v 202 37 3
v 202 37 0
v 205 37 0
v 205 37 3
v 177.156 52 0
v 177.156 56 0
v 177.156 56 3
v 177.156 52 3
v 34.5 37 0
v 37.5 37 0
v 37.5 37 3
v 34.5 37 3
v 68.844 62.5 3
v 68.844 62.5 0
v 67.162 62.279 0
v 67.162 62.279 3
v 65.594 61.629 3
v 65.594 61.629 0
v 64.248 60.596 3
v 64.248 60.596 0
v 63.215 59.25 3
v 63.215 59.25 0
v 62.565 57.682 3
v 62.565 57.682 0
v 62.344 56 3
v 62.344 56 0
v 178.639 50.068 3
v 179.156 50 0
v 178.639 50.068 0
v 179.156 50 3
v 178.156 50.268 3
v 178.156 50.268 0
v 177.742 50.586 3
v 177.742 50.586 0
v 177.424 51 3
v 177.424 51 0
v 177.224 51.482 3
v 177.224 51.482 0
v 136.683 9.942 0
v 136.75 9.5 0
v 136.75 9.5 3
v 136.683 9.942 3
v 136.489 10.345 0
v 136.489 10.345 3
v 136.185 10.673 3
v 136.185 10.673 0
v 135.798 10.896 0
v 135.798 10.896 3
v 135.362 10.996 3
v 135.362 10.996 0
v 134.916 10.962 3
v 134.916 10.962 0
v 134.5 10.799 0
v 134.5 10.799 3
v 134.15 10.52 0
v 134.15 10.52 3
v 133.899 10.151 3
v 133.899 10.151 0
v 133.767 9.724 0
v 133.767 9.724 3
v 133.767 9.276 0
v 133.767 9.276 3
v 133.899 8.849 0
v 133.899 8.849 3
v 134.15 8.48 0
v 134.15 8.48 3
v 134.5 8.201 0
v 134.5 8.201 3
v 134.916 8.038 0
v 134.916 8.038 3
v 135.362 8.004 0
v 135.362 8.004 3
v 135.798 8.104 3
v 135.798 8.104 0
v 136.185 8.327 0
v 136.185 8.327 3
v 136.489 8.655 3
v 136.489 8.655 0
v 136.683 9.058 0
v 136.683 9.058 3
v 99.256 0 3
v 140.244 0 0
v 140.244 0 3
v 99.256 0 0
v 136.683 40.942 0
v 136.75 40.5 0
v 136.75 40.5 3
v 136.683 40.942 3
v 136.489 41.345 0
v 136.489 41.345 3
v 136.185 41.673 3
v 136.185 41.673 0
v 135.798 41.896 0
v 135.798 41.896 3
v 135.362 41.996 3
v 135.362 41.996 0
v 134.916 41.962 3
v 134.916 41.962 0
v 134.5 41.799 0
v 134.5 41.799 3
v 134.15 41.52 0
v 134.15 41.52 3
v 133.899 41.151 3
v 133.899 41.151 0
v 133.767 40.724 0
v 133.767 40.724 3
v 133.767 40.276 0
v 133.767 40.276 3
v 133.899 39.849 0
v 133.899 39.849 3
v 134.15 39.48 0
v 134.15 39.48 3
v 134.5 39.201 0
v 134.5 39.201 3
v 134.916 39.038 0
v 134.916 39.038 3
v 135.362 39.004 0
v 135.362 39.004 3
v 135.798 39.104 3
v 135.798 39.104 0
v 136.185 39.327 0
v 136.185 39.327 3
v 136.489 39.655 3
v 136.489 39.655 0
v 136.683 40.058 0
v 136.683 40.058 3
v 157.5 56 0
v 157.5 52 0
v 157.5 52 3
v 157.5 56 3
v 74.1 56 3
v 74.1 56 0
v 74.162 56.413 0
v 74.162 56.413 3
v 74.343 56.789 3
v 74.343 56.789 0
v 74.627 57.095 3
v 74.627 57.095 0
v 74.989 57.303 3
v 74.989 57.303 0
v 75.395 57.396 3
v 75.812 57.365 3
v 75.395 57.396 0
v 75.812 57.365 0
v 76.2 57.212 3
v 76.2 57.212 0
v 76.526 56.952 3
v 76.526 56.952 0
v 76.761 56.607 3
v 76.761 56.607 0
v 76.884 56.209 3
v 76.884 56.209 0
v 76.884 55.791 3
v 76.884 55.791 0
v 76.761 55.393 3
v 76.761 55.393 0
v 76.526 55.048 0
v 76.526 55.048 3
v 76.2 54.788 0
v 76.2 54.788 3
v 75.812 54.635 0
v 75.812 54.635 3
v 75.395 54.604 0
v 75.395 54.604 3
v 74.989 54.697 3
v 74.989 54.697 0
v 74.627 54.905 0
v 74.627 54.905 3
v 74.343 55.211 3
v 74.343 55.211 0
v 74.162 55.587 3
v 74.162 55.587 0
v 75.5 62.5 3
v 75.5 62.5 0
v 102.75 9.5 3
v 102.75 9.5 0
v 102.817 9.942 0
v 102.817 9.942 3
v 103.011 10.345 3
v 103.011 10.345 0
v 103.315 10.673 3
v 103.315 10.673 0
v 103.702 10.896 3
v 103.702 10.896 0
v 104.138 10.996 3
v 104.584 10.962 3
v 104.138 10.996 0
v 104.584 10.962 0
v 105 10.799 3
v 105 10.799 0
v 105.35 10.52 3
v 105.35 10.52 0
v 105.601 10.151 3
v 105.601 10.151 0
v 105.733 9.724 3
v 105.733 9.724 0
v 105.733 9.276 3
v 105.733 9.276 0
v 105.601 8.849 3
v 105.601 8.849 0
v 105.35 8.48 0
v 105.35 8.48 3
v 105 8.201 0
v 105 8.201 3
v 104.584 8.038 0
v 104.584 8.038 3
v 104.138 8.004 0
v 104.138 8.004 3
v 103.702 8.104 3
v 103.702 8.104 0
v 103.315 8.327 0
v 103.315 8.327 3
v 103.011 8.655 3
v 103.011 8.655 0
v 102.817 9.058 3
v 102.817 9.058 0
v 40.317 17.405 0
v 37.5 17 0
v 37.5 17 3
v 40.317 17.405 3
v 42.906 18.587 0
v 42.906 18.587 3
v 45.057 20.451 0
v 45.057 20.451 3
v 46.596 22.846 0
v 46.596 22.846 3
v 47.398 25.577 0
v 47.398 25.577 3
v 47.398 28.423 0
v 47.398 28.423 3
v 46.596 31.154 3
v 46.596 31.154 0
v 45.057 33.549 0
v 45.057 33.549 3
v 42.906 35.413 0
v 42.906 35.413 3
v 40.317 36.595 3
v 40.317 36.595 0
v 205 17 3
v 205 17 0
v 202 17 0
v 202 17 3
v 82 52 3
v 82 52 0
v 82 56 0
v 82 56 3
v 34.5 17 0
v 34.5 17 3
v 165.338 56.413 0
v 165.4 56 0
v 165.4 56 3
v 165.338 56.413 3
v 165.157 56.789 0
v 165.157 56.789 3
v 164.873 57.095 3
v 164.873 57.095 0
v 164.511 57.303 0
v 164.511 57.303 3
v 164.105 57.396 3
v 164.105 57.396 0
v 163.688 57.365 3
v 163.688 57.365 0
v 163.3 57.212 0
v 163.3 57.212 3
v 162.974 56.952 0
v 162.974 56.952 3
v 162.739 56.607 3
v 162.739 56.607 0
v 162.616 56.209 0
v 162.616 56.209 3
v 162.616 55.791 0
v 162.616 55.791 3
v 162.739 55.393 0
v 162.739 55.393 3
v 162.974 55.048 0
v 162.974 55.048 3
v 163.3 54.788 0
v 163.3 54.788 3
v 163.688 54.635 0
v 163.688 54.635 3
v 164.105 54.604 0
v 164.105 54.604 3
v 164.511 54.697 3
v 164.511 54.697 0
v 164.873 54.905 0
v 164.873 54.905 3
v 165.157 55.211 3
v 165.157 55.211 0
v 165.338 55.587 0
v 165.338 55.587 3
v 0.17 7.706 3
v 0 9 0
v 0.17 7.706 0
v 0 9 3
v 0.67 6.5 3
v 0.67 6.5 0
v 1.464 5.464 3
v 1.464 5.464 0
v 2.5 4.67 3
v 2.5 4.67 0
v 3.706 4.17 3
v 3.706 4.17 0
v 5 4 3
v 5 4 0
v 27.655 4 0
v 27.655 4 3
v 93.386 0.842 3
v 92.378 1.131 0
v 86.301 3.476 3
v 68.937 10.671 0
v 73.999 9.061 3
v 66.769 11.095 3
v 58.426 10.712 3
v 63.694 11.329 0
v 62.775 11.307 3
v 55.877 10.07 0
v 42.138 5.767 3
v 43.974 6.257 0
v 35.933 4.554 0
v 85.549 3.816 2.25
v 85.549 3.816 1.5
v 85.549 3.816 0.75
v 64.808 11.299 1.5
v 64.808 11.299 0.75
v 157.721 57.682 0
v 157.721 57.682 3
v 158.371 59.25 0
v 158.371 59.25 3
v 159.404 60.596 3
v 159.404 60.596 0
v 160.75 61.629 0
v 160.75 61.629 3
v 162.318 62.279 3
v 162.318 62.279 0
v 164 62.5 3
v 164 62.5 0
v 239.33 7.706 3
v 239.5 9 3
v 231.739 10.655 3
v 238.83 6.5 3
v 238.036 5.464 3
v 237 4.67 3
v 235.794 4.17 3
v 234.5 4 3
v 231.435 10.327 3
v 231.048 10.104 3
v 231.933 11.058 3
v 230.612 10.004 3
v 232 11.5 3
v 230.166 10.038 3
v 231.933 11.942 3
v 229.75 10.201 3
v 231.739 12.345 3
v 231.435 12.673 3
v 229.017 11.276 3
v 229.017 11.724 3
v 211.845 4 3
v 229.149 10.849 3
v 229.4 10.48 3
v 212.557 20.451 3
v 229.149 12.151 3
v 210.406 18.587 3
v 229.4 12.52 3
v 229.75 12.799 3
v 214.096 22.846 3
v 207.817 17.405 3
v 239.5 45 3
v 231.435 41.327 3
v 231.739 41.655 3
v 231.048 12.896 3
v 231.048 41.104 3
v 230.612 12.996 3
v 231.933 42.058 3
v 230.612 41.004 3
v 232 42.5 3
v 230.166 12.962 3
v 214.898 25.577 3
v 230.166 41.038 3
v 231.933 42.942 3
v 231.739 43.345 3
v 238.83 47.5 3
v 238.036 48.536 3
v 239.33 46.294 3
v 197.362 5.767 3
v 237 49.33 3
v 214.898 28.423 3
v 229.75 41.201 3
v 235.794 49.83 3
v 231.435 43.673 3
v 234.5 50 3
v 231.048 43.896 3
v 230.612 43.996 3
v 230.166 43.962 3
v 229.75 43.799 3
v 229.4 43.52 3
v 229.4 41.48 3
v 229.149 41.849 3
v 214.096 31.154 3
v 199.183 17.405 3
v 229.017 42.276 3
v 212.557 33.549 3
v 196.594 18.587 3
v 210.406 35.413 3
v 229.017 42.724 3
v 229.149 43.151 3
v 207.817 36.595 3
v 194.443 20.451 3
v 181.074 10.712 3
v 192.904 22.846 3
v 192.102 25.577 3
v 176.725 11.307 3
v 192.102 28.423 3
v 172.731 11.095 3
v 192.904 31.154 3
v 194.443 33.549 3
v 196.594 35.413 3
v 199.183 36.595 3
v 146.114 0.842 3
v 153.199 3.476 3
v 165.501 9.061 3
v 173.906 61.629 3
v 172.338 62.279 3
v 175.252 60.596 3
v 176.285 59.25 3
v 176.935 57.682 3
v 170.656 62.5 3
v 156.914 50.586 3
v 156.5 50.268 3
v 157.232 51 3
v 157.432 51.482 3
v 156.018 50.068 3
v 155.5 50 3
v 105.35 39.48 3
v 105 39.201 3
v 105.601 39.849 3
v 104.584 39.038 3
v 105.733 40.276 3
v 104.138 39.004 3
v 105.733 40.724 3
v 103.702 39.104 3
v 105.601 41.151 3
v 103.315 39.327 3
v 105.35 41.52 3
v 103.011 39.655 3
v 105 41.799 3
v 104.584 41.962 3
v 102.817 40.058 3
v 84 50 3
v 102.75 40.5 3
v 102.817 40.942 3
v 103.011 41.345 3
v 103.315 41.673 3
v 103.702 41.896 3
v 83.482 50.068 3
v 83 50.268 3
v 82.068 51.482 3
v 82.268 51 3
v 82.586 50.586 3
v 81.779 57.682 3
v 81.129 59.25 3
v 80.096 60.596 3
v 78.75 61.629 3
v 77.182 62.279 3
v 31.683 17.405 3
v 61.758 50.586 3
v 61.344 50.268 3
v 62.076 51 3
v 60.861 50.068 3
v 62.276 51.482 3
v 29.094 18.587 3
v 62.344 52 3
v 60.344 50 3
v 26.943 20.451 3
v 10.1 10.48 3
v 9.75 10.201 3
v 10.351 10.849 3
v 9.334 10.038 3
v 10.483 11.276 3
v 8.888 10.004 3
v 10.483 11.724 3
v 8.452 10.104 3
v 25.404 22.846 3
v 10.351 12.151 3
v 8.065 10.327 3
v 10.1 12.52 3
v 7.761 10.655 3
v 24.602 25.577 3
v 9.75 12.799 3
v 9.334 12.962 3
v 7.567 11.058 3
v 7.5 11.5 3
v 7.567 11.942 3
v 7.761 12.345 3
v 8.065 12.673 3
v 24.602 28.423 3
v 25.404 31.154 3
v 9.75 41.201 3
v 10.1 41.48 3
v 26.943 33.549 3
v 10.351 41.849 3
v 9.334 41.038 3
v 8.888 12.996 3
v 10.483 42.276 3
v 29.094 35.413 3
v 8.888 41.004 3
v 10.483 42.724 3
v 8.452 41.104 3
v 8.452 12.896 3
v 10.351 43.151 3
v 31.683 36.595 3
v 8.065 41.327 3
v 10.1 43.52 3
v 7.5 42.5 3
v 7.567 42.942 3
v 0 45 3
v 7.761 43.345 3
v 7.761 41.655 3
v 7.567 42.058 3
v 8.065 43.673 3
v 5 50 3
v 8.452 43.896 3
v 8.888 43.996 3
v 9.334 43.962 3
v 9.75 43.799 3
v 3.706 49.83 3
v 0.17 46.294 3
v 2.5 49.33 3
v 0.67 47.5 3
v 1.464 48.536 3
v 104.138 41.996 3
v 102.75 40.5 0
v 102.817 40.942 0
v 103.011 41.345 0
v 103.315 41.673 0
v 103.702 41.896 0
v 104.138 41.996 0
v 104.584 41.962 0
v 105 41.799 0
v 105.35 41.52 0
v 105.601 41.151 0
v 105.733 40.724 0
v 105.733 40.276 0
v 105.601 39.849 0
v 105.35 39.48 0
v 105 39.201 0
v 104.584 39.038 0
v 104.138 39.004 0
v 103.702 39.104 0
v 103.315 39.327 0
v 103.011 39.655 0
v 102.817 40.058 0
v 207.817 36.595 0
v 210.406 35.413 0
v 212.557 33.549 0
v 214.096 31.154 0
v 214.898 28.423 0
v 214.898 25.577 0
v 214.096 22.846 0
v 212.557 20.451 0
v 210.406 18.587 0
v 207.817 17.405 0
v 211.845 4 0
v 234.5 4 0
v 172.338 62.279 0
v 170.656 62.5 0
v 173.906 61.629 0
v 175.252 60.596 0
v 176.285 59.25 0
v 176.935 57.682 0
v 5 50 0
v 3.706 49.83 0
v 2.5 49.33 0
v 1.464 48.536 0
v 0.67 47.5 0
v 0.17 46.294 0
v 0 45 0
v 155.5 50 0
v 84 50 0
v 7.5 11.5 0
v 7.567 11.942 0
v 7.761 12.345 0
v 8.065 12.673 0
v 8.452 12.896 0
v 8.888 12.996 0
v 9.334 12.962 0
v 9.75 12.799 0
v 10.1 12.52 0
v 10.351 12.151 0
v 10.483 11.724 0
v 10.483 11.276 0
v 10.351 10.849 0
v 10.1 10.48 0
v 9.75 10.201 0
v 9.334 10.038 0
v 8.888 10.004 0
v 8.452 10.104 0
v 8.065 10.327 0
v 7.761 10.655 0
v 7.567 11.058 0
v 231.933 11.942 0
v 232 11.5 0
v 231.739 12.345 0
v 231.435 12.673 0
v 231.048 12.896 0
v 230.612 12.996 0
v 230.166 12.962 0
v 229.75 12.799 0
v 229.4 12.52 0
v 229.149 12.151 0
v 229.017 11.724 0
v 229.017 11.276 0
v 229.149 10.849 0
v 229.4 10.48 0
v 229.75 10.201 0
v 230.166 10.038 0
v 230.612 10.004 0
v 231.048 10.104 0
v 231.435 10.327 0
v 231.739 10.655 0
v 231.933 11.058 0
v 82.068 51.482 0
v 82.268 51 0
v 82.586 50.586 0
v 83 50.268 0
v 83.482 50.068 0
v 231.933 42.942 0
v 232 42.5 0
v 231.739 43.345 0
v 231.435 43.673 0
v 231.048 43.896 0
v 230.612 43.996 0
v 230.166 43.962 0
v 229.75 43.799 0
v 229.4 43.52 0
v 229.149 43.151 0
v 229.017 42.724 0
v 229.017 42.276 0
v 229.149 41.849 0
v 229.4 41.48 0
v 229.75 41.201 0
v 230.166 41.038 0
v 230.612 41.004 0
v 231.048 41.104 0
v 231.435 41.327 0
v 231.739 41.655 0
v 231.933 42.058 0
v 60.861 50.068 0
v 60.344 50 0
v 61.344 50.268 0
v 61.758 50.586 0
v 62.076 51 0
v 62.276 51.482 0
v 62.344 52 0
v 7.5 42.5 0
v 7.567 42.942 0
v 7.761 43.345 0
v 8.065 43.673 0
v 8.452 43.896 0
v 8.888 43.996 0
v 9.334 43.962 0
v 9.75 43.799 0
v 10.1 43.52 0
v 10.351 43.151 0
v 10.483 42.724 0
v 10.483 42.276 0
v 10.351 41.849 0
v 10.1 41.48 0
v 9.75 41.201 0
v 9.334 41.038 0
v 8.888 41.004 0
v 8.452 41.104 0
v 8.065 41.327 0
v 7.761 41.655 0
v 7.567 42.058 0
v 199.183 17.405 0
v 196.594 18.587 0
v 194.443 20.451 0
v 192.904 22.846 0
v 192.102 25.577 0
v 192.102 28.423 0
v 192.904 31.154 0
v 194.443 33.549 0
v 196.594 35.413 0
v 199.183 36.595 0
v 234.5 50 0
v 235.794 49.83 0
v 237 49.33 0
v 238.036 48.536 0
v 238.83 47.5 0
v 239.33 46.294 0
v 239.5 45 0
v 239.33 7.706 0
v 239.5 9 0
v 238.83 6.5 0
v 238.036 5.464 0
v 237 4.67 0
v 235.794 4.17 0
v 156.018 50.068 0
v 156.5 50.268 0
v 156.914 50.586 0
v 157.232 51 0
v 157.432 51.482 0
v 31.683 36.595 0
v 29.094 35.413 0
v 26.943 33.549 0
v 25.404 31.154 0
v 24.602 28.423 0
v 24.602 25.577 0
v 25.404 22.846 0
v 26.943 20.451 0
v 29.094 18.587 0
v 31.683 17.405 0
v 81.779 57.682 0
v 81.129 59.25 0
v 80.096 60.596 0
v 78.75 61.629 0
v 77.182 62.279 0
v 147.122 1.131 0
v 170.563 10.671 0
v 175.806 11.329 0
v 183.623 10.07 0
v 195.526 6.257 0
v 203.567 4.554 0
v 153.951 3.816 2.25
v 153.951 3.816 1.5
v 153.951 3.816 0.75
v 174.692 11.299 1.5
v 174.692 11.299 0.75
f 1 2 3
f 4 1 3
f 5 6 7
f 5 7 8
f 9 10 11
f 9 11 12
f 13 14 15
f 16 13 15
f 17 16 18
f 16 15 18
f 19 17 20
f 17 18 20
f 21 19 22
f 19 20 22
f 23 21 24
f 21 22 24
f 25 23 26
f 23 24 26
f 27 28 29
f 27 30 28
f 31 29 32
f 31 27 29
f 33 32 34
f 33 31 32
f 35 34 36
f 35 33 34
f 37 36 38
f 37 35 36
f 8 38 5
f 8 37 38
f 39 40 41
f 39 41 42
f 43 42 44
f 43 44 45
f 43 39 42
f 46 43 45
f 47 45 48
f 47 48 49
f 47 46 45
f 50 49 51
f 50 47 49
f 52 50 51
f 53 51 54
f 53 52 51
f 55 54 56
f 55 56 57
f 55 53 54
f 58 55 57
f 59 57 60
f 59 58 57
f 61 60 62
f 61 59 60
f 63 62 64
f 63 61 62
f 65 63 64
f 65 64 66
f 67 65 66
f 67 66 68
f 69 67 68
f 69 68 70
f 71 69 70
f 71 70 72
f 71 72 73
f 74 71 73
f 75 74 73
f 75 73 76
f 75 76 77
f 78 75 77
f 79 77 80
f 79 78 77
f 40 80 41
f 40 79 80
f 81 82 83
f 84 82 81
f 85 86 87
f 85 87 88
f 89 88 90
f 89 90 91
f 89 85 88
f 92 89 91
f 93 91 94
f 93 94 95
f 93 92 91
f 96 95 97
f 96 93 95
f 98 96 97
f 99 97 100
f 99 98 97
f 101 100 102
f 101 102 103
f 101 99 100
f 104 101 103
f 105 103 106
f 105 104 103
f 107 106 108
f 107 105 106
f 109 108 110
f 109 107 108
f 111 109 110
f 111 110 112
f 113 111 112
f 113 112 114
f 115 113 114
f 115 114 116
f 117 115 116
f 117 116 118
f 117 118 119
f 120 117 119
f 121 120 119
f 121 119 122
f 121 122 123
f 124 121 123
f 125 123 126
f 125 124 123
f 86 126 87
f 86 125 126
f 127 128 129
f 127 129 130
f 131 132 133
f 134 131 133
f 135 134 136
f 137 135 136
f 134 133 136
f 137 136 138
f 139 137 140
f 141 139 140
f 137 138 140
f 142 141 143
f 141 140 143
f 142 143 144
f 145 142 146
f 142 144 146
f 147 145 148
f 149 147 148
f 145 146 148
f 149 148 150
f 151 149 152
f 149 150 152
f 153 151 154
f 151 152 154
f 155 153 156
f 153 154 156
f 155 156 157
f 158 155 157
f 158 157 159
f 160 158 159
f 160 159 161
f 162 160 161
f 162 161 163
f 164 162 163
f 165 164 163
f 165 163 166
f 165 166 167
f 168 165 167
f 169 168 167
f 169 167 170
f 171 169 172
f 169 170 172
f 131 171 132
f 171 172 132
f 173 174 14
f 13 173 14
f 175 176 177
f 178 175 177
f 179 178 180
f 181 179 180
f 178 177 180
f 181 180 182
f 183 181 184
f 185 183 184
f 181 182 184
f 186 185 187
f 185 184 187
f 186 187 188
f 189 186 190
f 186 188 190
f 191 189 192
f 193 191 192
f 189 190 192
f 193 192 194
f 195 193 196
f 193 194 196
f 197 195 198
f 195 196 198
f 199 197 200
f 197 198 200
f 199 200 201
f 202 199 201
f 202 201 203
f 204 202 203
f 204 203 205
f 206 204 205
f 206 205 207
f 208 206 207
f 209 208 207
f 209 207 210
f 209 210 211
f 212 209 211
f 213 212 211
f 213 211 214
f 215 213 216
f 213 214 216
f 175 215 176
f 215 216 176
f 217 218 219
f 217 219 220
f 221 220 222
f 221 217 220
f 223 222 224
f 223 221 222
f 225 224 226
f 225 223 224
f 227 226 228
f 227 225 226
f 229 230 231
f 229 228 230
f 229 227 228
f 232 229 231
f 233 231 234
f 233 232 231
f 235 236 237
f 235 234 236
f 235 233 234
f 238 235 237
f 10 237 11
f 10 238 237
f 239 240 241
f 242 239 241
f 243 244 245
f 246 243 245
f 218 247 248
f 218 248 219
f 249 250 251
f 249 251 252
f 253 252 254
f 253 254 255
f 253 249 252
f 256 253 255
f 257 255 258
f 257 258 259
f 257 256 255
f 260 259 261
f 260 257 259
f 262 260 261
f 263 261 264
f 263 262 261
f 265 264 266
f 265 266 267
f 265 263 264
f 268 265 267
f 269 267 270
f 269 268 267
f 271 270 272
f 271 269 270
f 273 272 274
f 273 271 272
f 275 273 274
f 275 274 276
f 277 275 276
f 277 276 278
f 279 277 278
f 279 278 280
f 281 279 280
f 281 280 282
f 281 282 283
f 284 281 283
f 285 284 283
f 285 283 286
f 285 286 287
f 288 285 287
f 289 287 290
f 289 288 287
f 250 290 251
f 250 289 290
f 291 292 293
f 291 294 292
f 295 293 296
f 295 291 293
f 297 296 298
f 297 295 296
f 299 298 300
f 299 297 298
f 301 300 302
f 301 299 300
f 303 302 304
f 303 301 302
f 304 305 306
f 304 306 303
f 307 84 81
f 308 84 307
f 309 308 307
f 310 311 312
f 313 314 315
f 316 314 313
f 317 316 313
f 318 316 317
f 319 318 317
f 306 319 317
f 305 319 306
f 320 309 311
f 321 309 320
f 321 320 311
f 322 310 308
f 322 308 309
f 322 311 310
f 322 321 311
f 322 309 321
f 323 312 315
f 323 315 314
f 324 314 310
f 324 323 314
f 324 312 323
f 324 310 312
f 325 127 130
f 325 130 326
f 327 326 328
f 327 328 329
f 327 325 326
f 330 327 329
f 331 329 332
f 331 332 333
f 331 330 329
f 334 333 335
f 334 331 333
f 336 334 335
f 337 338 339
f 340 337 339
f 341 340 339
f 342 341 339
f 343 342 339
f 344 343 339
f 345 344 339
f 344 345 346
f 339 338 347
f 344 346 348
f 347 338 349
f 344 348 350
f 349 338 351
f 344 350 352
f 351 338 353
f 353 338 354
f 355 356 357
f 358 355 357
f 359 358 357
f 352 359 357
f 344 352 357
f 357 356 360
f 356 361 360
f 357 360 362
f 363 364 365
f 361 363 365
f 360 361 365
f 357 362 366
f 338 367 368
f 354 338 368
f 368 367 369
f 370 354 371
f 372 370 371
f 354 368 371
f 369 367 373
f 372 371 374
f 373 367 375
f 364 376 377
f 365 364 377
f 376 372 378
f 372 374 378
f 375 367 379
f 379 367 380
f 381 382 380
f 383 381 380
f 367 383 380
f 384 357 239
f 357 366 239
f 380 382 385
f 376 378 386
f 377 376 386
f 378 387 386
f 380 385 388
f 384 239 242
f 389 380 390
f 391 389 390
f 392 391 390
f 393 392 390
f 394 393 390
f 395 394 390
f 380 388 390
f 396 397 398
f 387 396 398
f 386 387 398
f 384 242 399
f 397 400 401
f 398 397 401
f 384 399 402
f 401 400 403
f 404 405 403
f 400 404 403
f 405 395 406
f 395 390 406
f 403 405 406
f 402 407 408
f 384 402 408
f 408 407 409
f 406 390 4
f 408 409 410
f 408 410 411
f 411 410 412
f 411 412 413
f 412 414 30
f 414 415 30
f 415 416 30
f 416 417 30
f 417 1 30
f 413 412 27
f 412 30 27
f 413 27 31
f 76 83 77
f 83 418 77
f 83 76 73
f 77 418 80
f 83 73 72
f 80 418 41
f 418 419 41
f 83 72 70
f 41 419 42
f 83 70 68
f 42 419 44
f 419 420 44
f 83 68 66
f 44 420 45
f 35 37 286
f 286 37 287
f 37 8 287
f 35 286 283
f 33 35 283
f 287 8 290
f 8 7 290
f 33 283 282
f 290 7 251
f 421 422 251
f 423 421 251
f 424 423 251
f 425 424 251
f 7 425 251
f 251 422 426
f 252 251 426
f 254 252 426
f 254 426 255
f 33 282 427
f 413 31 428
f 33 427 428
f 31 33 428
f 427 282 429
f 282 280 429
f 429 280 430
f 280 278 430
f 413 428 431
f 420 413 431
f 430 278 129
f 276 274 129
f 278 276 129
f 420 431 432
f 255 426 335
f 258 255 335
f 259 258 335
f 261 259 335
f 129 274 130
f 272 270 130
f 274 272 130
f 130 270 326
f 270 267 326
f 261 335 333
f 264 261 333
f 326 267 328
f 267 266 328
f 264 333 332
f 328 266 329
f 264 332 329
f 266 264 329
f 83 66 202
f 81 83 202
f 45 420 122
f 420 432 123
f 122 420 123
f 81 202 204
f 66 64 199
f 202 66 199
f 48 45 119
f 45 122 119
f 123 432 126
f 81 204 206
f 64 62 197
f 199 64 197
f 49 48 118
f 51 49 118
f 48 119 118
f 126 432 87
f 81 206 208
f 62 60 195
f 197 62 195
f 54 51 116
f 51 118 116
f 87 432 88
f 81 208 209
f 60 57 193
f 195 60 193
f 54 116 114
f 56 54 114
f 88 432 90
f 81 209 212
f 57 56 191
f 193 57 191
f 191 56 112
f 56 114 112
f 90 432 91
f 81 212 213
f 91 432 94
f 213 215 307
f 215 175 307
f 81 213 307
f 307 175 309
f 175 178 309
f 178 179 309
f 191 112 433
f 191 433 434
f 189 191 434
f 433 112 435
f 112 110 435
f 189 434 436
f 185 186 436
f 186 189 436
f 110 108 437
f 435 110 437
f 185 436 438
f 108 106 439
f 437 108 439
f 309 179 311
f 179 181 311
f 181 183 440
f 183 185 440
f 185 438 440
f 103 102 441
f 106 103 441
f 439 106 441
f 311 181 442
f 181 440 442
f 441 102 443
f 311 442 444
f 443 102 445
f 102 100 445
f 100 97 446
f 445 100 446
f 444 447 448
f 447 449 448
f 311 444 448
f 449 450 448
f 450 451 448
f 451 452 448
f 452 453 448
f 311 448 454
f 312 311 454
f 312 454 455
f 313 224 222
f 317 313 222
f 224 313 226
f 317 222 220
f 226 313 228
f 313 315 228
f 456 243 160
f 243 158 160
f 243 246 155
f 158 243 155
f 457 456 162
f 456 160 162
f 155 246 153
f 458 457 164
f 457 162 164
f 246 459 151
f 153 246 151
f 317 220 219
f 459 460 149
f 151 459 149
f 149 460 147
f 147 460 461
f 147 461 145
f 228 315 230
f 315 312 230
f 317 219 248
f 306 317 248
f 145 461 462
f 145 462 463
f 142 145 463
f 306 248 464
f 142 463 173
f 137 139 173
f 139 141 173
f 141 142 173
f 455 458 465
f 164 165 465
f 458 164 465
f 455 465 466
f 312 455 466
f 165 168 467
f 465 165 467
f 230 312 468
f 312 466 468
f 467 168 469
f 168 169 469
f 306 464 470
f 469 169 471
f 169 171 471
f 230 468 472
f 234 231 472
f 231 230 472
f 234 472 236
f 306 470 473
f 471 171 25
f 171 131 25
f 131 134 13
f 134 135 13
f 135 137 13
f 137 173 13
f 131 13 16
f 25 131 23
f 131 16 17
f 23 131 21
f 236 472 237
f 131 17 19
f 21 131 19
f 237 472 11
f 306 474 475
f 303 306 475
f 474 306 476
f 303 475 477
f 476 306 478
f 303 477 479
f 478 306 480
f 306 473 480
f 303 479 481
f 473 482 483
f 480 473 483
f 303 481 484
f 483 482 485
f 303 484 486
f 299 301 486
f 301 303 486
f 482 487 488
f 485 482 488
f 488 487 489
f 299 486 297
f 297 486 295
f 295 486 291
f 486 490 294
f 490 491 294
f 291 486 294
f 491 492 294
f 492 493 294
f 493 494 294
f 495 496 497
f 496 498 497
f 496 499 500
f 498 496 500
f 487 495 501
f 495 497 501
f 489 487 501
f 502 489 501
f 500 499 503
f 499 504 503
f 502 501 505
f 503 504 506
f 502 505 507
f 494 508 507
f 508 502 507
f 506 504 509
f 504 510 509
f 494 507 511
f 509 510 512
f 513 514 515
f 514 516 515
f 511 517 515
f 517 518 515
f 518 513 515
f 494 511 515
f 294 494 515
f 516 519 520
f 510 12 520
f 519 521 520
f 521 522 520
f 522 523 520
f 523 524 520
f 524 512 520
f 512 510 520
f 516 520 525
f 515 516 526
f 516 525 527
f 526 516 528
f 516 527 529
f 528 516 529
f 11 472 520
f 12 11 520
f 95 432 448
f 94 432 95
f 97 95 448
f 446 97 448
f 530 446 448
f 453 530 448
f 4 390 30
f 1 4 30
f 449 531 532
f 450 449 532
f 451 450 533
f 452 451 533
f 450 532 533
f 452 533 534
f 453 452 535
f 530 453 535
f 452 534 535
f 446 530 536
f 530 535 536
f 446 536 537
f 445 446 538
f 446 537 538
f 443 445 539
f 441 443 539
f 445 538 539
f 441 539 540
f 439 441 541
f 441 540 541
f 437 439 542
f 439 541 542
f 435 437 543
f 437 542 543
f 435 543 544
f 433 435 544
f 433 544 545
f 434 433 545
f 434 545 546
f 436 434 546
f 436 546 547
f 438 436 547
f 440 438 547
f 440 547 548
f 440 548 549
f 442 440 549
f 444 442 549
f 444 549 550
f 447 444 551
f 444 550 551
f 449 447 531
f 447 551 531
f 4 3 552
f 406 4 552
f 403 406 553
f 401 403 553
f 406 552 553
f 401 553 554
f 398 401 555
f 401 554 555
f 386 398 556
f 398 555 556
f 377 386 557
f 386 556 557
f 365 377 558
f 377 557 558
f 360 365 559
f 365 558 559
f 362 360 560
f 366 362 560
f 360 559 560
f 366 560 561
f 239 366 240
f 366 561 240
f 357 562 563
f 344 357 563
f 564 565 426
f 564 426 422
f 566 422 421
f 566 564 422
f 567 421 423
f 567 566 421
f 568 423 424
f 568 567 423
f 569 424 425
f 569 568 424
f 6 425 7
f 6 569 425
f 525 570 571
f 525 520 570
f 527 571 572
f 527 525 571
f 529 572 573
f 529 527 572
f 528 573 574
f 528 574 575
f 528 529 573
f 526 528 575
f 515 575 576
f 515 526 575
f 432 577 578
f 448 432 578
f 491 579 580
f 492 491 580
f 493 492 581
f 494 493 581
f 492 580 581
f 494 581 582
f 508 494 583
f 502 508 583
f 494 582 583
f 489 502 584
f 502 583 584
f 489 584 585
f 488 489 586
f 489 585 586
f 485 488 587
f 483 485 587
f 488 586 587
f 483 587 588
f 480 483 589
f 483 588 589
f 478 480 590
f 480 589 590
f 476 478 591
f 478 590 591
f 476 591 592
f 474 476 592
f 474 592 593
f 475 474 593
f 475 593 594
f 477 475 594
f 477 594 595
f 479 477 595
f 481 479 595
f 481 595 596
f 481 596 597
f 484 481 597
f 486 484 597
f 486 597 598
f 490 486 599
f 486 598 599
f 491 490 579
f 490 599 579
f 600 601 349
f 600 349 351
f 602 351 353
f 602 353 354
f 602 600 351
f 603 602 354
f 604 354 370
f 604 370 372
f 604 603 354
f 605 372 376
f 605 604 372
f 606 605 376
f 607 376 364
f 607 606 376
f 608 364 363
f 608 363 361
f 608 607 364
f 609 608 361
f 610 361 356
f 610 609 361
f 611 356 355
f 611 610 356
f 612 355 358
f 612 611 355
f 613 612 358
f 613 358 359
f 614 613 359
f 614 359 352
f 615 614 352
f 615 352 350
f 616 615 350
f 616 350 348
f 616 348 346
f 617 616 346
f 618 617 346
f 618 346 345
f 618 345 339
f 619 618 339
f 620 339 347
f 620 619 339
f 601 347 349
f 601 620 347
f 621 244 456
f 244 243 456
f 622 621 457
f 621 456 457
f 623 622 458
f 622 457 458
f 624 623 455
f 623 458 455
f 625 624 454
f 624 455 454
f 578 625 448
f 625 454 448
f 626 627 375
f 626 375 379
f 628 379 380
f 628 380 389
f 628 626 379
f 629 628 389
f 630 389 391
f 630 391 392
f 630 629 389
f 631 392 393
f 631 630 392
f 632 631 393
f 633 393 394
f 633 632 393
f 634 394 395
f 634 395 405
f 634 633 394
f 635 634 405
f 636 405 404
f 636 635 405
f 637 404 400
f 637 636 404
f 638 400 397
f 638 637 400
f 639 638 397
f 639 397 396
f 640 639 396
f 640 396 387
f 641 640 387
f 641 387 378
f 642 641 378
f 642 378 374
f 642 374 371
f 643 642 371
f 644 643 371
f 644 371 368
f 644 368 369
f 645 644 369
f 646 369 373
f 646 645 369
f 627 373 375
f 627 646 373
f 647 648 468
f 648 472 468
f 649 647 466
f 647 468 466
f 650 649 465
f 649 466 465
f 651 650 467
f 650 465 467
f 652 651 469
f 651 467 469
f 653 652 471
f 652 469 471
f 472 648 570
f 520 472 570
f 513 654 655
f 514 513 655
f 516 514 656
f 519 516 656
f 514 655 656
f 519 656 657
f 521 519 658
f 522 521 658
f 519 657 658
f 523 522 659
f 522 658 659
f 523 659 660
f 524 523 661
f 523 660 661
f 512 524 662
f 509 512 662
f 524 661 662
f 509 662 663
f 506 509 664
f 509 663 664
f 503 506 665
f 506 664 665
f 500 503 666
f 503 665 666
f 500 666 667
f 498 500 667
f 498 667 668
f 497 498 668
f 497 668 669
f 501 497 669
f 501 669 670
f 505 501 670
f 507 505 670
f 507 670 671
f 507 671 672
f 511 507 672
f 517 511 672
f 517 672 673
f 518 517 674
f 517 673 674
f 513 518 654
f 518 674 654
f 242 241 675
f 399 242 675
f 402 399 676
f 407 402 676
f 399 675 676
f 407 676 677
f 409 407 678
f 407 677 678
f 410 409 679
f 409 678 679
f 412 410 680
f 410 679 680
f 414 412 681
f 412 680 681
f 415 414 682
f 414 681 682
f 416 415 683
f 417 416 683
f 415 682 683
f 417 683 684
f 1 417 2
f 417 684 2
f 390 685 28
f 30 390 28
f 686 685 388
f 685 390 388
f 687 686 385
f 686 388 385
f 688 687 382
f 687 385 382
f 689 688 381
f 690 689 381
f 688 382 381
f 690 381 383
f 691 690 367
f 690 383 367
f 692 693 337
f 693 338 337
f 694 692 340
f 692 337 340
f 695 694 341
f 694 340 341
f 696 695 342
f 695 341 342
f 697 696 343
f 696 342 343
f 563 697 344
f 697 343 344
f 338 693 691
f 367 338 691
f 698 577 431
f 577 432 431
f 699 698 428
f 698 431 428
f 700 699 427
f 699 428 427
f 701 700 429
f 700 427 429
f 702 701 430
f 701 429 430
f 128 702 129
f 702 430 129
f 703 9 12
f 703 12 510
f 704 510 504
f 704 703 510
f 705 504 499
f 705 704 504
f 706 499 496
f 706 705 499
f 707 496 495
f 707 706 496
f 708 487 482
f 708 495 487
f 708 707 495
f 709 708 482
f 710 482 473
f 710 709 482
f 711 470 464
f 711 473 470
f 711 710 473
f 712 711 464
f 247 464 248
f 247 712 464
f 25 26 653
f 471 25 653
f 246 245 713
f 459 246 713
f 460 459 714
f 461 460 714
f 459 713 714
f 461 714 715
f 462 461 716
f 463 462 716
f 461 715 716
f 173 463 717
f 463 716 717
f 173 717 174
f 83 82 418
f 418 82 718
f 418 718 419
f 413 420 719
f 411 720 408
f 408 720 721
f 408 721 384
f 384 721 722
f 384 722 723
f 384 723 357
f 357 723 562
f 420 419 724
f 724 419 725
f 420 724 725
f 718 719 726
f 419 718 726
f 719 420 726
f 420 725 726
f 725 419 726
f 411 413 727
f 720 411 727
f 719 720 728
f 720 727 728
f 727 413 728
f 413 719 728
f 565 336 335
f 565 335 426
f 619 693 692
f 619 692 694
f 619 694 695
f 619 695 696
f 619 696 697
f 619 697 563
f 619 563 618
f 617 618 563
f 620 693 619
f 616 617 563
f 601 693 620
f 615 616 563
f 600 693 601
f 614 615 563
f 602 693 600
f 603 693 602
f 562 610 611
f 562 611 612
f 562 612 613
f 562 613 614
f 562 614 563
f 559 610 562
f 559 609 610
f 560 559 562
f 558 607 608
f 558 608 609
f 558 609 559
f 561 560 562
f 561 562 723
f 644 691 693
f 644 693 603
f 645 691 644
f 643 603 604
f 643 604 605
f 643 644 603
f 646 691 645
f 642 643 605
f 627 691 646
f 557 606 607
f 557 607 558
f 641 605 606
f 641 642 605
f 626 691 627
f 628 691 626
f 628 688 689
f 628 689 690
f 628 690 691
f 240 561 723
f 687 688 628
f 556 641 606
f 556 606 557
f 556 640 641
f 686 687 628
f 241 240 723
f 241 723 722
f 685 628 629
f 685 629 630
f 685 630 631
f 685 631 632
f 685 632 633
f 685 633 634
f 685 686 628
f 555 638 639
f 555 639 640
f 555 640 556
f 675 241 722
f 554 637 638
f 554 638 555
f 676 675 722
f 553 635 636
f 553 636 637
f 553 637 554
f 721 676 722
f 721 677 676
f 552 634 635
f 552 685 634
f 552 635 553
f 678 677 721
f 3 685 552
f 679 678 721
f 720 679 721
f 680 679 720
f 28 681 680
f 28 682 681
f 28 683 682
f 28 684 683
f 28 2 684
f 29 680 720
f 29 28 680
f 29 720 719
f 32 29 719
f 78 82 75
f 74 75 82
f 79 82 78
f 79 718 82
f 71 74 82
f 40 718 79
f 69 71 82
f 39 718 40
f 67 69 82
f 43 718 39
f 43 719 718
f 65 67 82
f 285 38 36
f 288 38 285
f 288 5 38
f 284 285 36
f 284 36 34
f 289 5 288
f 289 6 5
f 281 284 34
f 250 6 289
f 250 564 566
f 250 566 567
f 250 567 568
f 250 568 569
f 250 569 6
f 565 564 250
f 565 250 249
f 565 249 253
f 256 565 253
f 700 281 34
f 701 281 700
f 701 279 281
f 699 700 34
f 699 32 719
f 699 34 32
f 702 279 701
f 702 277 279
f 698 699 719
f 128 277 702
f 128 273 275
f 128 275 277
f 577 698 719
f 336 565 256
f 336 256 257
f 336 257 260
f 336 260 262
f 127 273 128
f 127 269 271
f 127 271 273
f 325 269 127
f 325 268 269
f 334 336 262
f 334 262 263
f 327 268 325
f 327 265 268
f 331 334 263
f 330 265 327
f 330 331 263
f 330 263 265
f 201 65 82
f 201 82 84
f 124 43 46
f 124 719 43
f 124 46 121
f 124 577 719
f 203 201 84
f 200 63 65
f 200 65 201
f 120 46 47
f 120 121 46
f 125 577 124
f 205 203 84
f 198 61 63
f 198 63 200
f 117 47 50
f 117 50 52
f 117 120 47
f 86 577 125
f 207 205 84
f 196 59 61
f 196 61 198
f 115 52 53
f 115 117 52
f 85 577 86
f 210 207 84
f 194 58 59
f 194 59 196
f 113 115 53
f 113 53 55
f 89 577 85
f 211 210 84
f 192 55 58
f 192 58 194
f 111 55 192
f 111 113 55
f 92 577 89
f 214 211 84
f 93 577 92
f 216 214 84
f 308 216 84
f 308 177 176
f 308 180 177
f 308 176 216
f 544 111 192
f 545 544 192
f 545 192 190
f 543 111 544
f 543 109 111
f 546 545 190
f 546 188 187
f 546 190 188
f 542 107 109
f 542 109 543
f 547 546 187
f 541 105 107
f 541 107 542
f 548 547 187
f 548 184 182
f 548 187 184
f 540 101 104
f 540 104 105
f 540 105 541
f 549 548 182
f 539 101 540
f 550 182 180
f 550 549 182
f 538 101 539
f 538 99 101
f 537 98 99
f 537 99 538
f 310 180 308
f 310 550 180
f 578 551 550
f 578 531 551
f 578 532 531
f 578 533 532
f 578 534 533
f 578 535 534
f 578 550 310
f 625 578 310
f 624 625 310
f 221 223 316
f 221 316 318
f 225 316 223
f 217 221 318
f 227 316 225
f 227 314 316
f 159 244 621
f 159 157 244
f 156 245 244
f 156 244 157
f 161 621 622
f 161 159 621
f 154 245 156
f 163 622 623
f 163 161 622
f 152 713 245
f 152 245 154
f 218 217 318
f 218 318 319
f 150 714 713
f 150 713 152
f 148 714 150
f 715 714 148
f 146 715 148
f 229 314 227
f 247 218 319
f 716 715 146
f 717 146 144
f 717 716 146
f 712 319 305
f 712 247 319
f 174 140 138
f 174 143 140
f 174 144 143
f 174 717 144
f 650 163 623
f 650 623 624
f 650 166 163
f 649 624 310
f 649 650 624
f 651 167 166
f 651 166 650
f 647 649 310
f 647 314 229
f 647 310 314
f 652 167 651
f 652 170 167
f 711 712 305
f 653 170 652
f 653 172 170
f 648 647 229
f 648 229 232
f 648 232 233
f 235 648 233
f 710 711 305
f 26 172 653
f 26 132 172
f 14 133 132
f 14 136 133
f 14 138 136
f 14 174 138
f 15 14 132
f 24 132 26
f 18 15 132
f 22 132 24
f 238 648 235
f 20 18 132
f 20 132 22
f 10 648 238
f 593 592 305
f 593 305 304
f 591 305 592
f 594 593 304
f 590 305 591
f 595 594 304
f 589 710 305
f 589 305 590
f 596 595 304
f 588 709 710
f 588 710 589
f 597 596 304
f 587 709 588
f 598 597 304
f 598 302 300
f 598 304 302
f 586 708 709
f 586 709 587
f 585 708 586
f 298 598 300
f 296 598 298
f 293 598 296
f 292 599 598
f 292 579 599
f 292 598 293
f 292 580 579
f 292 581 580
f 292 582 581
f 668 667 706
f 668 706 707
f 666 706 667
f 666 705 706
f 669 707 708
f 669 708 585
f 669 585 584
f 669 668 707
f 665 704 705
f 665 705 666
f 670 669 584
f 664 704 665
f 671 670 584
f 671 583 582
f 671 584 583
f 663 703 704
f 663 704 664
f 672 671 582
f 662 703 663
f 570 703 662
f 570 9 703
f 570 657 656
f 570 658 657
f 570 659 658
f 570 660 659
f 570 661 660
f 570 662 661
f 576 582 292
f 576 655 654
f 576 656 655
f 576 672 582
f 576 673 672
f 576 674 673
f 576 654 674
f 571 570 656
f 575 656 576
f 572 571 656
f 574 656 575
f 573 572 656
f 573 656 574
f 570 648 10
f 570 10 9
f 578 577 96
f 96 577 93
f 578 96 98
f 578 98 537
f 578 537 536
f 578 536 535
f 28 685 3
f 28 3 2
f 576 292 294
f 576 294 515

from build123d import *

# Parameters (mm, degrees)
SKETCH1_W           = 119.75
SKETCH1_H           = 50
BOSS_EXTRUDE1_DEPTH = 3
SKETCH2_R           = 1.5
CUT_EXTRUDE1_DEPTH  = 3
SKETCH3_R           = 1.4
BOSS_EXTRUDE2_DEPTH = 3
FILLET1_R           = 2
CUT_EXTRUDE2_DEPTH  = 10
FILLET2_R           = 5
CUT_EXTRUDE3_DEPTH  = 10


with BuildPart() as part:
    # Sketch1 → Boss-Extrude1 (new body)
    with BuildSketch(Plane.XY):
        with Locations((59.875, 25)):
            Rectangle(SKETCH1_W, SKETCH1_H)
    extrude(amount=BOSS_EXTRUDE1_DEPTH)

    # Sketch2 → Cut-Extrude1 (cut)
    with BuildSketch(Plane(origin=(0, 0, 0), x_dir=(-1, 0, 0), z_dir=(0, 0, -1))):
        with Locations((-104.25, 40.5)):
            Circle(SKETCH2_R)
        with Locations((-104.25, 9.5)):
            Circle(SKETCH2_R)
        with Locations((-9, 42.5)):
            Circle(SKETCH2_R)
        with Locations((-9, 11.5)):
            Circle(SKETCH2_R)
    extrude(amount=-CUT_EXTRUDE1_DEPTH, mode=Mode.SUBTRACT)

    # Mirror1: part across plane


with BuildPart() as part_1:
    add(part.part)
    add(part.part.mirror(Plane(origin=(119.75, 0, 3), x_dir=(0, 0, 1), z_dir=(-1, 0, 0))))

    # Sketch3 → Boss-Extrude2 (add)
    with BuildSketch(Plane(origin=(0, 0, 0), x_dir=(-1, 0, 0), z_dir=(0, 0, -1))):
        with BuildLine():
            Line((-82, 50), (-82, 56))
            ThreePointArc((-82, 56), (-80.096194078, 60.596194078), (-75.5, 62.5))
            Line((-75.5, 62.5), (-68.843823796, 62.5))
            ThreePointArc((-68.843823796, 62.5), (-64.247629718, 60.596194078), (-62.343823796, 56))
            Line((-62.343823796, 56), (-62.343823796, 50))
            Line((-62.343823796, 50), (-82, 50))
        make_face()
        with Locations((-75.5, 56)):
            Circle(SKETCH3_R, mode=Mode.SUBTRACT)
    boss_extrude2 = extrude(amount=-BOSS_EXTRUDE2_DEPTH)

    # Mirror2: Boss-Extrude2 across plane
    add(boss_extrude2.mirror(Plane(origin=(119.75, 0, 0), x_dir=(0, 0, 1), z_dir=(1, 0, 0))))

    # Fillet1
    fillet1_edges = [part_1.edges().sort_by_distance(p)[0] for p in [
        (177.156176204, 50, 1.5),
        (157.5, 50, 1.5),
        (62.343823796, 50, 1.5),
        (82, 50, 1.5),
    ]]
    fillet(fillet1_edges, radius=FILLET1_R)

    # Sketch4 → Cut-Extrude2 (cut)
    with BuildSketch(Plane(origin=(0, 0, 0), x_dir=(-1, 0, 0), z_dir=(0, 0, -1))):
        with BuildLine():
            Line((-27.655095692, 4), (0, 4))
            Line((0, 4), (0, 0))
            Line((0, 0), (-99.256160352, 0))
            add(Edge.make_bspline(
                [(-99.256160352, 0), (-90.116604623, 0), (-79.005268065, 8.449150394), (-62.736804921, 12.15262313), (-50.625142782, 8.672513345), (-38.701859446, 4), (-27.655095692, 4)],
                knots=[0, 0, 0, 0, 0.434613944, 0.535270934, 0.727022104, 1, 1, 1, 1], degree=3))
        make_face()
    cut_extrude2 = extrude(amount=-CUT_EXTRUDE2_DEPTH, mode=Mode.SUBTRACT)

    # Mirror3: Cut-Extrude2 across plane
    add(cut_extrude2.mirror(Plane(origin=(119.75, 0, 0), x_dir=(0, 0, 1), z_dir=(1, 0, 0))), mode=Mode.SUBTRACT)

    # Fillet2
    fillet2_edges = [part_1.edges().sort_by_distance(p)[0] for p in [
        (239.5, 4, 1.5),
        (239.5, 50, 1.5),
        (0, 4, 1.5),
        (0, 50, 1.5),
    ]]
    fillet(fillet2_edges, radius=FILLET2_R)

    # Sketch5 → Cut-Extrude3 (cut)
    with BuildSketch(Plane(origin=(0, 0, 0), x_dir=(-1, 0, 0), z_dir=(0, 0, -1))):
        with BuildLine():
            Line((-34.5, 17), (-37.5, 17))
            ThreePointArc((-37.5, 17), (-47.5, 27), (-37.5, 37))
            Line((-37.5, 37), (-34.5, 37))
            ThreePointArc((-34.5, 37), (-24.5, 27), (-34.5, 17))
        make_face()
    cut_extrude3 = extrude(amount=-CUT_EXTRUDE3_DEPTH, mode=Mode.SUBTRACT)

    # Mirror4: Cut-Extrude3 across plane
    add(cut_extrude3.mirror(Plane(origin=(119.75, 0, 0), x_dir=(0, 0, 1), z_dir=(1, 0, 0))), mode=Mode.SUBTRACT)


solid = part_1.part
